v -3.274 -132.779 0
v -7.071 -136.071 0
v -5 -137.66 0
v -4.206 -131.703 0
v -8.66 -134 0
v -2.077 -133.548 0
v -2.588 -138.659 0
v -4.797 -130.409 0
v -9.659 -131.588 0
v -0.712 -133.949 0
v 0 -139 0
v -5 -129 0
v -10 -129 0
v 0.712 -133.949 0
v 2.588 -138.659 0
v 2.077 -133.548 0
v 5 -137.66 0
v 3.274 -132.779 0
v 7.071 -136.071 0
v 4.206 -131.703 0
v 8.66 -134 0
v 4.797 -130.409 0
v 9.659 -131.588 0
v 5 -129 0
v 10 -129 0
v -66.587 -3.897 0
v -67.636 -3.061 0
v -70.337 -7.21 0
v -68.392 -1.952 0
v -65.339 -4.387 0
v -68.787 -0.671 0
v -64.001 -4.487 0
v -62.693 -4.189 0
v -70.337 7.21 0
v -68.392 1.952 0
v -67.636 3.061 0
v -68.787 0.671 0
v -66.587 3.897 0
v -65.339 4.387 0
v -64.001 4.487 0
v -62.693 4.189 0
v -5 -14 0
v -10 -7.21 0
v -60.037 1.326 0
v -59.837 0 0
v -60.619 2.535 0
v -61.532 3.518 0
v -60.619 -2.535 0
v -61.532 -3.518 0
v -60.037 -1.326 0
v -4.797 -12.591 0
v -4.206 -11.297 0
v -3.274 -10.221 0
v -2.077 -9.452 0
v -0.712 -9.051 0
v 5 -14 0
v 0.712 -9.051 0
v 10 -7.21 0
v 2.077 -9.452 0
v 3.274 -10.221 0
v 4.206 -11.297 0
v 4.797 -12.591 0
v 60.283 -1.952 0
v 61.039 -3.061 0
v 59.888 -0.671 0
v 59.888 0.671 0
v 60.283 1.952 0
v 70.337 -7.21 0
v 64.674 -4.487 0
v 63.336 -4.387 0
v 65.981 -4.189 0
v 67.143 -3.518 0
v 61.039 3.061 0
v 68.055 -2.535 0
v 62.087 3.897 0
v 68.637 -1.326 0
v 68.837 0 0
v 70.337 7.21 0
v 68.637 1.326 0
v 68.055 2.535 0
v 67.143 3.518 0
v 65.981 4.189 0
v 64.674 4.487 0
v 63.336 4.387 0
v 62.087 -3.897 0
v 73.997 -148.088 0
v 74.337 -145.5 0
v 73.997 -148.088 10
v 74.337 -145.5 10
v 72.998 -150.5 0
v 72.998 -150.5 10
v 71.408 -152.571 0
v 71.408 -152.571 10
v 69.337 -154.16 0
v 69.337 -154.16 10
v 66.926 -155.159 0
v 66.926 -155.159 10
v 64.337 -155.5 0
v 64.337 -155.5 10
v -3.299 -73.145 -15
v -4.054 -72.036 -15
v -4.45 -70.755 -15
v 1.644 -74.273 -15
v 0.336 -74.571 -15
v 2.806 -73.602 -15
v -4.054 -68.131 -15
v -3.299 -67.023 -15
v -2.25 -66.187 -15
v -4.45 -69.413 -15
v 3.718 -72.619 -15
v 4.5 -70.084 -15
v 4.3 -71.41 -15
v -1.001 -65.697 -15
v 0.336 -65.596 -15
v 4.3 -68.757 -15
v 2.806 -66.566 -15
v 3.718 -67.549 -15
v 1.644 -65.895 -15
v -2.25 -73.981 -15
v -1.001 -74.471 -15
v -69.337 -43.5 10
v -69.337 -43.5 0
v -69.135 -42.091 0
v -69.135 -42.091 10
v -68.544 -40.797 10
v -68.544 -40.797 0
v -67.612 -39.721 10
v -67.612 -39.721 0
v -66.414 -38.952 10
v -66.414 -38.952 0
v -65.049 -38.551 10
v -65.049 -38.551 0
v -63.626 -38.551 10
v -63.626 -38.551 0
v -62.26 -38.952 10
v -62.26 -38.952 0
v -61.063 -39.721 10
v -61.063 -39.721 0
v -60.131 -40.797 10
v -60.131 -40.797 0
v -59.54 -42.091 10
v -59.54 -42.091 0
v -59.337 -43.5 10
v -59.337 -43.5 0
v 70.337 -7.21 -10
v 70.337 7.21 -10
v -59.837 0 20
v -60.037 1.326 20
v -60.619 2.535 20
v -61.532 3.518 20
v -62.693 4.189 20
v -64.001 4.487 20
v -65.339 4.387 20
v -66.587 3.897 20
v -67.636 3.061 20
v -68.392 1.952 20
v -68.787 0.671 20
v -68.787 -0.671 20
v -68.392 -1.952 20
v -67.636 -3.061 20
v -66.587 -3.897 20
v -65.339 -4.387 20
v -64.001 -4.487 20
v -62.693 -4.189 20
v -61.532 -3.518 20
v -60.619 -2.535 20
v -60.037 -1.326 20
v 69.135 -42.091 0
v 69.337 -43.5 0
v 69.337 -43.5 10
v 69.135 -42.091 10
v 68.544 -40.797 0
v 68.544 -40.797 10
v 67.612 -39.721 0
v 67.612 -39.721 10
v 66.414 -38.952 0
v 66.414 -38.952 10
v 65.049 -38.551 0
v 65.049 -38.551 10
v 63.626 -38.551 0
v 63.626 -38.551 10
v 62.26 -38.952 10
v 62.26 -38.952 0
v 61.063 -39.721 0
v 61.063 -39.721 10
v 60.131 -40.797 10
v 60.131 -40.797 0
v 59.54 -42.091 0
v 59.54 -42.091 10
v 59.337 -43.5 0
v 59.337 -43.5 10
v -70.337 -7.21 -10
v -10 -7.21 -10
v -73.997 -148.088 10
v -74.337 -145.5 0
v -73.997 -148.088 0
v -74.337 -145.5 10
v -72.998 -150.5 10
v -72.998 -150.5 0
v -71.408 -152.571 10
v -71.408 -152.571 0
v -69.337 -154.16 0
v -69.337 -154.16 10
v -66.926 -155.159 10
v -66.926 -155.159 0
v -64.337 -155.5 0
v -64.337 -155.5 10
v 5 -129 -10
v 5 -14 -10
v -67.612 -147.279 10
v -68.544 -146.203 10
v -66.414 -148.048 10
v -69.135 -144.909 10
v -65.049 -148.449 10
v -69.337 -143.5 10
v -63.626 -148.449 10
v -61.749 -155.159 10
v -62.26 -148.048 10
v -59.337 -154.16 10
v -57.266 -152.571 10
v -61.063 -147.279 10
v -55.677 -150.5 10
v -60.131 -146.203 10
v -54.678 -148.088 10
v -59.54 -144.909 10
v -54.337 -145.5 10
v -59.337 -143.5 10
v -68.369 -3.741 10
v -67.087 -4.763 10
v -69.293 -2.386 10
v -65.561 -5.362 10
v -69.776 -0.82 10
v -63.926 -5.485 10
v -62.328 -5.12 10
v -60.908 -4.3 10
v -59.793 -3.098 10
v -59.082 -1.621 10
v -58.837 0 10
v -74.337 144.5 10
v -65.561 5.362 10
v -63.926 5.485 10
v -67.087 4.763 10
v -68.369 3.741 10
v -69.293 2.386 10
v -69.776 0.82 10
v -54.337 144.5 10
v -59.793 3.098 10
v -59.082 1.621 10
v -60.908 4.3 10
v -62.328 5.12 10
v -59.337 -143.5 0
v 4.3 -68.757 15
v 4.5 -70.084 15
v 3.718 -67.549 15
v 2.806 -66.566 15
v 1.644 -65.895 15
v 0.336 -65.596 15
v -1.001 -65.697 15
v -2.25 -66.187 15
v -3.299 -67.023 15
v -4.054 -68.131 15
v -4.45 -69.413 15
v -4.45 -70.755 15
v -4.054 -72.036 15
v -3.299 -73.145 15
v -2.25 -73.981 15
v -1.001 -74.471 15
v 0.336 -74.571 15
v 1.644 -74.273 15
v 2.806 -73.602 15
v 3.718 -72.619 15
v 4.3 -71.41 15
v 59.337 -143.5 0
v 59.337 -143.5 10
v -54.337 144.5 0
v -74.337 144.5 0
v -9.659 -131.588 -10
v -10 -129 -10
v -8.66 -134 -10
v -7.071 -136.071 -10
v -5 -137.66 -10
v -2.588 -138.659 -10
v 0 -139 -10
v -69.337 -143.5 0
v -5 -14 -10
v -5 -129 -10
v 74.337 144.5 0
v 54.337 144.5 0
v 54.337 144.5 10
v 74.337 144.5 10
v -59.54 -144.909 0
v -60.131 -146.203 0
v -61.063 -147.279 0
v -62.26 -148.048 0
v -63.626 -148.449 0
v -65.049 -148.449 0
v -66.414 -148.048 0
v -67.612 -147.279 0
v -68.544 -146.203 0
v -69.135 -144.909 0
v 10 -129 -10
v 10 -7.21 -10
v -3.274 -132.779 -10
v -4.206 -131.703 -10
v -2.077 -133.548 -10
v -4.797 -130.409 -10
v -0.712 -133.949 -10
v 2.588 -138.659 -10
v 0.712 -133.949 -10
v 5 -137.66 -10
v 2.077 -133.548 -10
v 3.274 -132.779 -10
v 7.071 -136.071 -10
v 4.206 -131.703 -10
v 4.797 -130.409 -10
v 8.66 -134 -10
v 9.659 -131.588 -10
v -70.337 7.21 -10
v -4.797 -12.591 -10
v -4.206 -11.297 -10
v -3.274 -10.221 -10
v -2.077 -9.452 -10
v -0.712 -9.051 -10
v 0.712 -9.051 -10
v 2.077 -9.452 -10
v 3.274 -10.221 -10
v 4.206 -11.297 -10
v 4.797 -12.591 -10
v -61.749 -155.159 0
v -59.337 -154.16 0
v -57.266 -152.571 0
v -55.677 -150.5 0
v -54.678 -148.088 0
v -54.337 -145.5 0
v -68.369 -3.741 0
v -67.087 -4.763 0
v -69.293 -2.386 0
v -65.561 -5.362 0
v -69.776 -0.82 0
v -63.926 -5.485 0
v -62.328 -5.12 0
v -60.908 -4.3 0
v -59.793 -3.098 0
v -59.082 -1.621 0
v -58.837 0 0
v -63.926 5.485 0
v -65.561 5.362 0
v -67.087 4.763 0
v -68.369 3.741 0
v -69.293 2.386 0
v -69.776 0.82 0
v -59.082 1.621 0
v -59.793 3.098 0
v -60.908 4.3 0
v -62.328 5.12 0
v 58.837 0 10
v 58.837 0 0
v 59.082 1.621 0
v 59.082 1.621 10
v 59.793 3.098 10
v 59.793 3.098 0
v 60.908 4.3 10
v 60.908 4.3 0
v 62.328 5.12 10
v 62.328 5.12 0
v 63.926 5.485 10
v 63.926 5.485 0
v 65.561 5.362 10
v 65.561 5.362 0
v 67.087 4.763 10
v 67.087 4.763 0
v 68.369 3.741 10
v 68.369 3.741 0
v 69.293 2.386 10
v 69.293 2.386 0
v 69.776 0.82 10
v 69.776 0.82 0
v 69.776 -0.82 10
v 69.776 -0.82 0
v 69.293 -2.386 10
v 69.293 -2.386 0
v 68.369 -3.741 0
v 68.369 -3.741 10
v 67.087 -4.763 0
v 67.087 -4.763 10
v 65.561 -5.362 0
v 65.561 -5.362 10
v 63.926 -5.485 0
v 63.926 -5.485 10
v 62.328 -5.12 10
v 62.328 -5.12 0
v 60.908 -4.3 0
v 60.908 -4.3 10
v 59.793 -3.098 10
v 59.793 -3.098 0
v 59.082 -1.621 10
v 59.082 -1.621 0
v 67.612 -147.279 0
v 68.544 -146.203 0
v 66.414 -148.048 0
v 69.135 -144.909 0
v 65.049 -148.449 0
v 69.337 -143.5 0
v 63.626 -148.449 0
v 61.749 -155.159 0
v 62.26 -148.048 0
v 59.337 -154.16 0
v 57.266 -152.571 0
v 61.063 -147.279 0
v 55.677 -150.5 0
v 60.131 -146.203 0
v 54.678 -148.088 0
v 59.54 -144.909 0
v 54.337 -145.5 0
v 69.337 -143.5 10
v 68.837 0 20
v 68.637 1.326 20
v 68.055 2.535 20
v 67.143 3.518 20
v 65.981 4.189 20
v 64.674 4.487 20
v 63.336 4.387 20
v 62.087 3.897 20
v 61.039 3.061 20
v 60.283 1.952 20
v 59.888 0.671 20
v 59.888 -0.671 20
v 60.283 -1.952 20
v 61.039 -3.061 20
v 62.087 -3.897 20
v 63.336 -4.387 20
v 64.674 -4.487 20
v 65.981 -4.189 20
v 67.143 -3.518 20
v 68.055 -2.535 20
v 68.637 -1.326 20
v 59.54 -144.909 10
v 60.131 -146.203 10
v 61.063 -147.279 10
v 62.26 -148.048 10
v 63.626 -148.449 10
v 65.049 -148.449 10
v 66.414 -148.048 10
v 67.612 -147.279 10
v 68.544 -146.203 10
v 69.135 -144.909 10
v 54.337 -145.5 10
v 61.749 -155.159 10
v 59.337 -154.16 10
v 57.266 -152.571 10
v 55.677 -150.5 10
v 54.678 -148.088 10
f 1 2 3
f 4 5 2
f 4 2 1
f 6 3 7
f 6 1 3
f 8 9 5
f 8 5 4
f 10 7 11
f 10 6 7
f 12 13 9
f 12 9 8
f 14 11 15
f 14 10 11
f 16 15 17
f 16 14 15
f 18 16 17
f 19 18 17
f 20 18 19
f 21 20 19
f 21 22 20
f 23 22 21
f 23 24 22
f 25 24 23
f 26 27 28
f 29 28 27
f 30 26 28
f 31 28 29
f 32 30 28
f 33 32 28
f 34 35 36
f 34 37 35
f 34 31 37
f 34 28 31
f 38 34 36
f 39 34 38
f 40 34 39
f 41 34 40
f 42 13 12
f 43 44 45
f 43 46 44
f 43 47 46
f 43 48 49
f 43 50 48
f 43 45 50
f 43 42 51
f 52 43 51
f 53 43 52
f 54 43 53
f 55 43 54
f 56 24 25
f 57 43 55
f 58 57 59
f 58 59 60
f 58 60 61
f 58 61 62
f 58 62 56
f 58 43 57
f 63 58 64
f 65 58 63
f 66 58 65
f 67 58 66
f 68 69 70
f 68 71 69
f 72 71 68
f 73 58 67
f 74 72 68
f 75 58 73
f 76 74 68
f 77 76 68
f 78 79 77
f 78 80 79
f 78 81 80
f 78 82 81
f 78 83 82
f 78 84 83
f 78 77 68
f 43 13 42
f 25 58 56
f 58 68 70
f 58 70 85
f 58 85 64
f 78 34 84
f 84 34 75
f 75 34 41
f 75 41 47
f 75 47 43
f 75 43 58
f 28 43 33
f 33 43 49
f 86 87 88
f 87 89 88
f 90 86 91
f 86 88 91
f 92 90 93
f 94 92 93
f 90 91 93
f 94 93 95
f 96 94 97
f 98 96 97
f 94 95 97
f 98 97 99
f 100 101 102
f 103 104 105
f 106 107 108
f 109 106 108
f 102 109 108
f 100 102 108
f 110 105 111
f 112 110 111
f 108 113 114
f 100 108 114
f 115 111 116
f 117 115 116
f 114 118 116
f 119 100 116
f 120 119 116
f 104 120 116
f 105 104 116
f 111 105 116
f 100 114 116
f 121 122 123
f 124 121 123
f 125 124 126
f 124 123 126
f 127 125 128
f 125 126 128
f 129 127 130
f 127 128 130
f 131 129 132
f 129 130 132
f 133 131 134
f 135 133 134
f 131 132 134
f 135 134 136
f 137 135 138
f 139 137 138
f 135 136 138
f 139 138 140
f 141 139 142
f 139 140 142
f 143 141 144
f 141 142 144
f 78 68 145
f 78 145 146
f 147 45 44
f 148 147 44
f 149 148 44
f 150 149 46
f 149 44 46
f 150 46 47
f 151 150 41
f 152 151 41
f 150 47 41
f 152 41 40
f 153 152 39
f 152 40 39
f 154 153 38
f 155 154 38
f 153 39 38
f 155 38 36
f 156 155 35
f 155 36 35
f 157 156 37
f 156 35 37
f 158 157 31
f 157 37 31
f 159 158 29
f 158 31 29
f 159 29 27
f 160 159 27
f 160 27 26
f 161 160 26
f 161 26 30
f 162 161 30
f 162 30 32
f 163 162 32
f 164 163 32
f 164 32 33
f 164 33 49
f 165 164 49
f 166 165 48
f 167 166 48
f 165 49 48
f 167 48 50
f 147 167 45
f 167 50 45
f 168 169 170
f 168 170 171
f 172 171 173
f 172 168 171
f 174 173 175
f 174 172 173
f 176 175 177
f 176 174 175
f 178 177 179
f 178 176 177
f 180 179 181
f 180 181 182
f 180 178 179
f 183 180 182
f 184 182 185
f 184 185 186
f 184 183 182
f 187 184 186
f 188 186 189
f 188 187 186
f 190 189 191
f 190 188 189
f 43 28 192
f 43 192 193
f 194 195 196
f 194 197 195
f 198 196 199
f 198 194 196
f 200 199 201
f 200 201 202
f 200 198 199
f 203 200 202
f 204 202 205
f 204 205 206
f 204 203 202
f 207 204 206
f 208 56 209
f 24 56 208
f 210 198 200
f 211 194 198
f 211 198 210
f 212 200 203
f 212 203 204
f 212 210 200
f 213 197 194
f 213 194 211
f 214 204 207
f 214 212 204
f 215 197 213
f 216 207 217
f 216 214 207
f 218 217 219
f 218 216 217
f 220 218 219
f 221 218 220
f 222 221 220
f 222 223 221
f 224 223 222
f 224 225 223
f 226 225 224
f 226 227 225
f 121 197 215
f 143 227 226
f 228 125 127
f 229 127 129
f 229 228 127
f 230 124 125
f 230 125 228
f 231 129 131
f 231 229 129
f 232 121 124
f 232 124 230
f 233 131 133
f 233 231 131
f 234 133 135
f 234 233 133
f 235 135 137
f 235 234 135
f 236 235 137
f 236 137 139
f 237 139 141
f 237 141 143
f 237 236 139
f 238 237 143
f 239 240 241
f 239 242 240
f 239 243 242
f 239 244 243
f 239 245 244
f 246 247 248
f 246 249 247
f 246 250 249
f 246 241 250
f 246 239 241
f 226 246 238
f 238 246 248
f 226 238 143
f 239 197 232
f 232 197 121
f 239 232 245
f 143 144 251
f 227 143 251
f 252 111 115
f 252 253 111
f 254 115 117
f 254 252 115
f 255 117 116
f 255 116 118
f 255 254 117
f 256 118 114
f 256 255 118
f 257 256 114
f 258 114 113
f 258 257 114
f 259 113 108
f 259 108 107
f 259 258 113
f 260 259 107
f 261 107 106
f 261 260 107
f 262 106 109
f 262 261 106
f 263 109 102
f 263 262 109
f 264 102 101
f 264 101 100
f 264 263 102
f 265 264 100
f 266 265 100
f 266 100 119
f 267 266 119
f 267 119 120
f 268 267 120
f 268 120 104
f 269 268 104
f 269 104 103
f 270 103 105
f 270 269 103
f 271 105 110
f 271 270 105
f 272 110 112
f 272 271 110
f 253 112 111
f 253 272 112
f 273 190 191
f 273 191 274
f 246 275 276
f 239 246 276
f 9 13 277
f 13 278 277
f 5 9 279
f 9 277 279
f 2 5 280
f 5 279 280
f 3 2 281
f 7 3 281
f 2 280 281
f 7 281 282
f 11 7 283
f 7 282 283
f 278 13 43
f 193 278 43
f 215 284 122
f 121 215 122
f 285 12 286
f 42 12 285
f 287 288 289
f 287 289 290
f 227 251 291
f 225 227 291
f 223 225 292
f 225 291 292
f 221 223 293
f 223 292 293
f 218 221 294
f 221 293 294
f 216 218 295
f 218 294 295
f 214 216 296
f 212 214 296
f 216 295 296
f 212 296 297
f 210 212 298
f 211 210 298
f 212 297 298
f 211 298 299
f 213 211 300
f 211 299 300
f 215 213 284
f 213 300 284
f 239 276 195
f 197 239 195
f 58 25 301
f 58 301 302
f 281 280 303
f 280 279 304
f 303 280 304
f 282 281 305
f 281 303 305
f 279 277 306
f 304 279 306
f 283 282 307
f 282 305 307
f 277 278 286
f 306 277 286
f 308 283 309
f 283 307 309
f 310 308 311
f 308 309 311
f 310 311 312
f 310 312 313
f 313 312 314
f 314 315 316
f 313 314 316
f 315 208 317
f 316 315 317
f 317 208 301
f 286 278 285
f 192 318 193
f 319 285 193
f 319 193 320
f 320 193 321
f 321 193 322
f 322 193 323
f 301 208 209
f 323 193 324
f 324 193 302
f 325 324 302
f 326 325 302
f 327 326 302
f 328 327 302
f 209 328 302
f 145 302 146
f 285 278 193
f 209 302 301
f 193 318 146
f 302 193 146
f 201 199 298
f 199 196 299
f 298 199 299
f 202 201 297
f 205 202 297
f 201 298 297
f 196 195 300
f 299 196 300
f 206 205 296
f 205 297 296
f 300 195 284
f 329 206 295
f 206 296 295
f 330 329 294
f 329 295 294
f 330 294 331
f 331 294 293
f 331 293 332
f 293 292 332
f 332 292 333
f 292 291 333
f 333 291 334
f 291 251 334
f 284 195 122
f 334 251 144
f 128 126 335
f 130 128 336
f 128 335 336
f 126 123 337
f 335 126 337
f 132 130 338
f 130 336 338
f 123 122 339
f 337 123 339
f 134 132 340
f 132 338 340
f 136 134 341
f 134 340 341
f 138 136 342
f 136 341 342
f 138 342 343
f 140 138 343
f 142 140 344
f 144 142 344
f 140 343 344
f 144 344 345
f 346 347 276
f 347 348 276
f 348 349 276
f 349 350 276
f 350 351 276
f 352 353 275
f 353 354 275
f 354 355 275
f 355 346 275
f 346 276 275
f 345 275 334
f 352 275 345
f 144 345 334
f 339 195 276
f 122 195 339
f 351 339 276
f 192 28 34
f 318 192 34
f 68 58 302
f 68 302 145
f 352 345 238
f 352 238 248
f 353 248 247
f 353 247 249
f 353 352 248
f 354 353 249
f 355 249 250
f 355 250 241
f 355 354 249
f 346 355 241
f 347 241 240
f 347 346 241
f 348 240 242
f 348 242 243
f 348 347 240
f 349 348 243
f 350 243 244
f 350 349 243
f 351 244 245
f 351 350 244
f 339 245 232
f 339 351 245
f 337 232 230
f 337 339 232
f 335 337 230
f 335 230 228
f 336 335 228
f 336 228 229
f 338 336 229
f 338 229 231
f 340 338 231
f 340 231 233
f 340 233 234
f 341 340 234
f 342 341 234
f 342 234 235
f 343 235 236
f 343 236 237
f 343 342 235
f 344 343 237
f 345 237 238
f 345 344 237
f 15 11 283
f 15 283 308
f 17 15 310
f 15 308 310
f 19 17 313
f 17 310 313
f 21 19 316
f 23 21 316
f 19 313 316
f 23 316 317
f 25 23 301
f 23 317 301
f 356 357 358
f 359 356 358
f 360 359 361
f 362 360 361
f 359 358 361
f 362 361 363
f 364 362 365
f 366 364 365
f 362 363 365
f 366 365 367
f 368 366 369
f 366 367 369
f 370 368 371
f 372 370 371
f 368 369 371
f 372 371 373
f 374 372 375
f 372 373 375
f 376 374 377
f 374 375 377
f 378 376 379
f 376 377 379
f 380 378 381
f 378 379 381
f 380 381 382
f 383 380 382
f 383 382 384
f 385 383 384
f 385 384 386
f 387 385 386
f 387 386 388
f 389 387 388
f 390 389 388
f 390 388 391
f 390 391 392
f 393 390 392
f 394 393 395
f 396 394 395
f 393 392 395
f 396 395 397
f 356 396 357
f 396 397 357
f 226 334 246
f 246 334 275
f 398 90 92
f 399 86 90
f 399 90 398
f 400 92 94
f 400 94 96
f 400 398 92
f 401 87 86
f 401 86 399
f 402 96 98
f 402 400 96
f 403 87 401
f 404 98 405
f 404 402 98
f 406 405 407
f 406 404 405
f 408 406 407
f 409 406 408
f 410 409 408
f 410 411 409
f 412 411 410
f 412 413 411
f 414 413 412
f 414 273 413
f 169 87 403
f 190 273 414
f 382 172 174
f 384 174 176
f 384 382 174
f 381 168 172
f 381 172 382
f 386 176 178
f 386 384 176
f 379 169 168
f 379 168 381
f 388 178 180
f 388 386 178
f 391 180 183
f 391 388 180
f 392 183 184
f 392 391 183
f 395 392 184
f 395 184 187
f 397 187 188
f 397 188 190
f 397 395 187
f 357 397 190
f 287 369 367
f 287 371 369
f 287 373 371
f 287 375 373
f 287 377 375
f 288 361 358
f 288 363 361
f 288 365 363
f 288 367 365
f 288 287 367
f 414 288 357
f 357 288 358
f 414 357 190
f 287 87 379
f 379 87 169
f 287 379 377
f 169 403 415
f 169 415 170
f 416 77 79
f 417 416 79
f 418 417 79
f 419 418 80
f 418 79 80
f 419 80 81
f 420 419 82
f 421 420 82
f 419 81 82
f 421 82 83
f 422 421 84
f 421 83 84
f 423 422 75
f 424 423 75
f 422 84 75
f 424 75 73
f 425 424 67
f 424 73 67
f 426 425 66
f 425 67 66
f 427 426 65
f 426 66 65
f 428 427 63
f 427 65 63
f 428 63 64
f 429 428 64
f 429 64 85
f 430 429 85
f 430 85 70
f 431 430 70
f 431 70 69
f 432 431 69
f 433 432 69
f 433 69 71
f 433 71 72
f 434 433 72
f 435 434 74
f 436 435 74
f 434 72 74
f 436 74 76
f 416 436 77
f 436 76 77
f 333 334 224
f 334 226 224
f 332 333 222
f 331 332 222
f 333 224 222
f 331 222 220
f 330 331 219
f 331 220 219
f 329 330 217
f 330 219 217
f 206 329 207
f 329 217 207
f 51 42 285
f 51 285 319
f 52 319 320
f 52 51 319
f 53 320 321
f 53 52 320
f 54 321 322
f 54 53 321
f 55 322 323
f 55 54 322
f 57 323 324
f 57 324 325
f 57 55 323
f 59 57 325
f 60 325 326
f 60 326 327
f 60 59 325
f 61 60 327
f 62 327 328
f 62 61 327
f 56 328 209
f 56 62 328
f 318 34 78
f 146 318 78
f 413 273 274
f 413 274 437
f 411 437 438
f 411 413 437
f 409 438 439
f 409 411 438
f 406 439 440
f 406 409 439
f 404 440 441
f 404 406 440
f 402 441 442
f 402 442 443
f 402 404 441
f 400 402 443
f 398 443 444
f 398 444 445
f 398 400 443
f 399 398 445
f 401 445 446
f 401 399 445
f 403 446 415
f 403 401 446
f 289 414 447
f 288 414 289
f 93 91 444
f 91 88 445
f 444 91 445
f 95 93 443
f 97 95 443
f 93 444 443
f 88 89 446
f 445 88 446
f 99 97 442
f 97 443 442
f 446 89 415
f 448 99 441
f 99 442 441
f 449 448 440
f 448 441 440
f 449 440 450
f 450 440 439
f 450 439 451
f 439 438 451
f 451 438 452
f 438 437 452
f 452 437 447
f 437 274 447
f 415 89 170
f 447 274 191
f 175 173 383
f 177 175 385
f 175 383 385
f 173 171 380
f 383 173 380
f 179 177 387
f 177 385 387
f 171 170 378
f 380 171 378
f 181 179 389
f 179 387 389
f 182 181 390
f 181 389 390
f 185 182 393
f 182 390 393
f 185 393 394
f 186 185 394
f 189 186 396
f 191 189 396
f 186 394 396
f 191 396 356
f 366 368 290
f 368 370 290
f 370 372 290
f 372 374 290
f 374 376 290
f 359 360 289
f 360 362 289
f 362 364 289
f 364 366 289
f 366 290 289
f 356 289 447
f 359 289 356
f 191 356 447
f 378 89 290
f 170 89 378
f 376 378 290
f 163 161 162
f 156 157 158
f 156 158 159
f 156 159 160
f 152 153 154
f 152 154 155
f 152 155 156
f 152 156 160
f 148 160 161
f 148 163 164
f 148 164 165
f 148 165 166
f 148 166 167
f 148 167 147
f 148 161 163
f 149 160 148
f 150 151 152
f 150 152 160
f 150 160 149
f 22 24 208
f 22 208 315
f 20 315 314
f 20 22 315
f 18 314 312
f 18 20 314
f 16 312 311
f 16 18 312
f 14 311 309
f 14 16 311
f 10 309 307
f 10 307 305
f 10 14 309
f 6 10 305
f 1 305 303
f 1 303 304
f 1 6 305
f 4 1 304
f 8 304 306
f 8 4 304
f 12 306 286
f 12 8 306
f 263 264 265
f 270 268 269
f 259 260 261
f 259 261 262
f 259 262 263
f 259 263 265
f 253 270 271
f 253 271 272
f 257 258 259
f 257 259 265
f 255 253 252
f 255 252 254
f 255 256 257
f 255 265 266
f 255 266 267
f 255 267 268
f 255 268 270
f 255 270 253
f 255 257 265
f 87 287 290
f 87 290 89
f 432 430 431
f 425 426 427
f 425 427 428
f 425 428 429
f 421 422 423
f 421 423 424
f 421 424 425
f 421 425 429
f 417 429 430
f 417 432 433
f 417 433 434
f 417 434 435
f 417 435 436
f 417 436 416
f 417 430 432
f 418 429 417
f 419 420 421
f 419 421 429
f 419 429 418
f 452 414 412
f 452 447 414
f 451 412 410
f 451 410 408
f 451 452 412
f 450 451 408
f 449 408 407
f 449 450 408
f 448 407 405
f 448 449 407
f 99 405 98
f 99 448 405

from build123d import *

# Parameters (mm, degrees)
F0_W      = 140.6747102737
F0_H      = 14.4206369296
F1_DEPTH  = 10
F2_R      = 4.5
F3_DEPTH  = 20
F4_W      = 16
F4_H      = 14.4206369296
F4_R      = 5.5
F5_DEPTH  = 10
F7_R      = 4.5
F8_DEPTH  = 15
F9_W      = 20
F9_H      = 131.7896815352
F10_DEPTH = 10
F11_R     = 9.99999
F12_R     = 9.99999
F13_R     = 9.99999


# Not quite as in the source:
# - a fillet or chamfer is up to 0.001 mm smaller than in the source, because OpenCascade refuses the exact size


with BuildPart() as f1:
    # F0 (on Top) → F1 (new body)
    with BuildSketch(Plane.XY):
        Rectangle(F0_W, F0_H)
    extrude(amount=-F1_DEPTH)

    # F2 (on face) → F3 (join)
    with BuildSketch(Plane.XY):
        with Locations((-64.3373551369, 0)):
            Circle(F2_R)
        with Locations((64.3373551369, 0)):
            Circle(F2_R)
    extrude(amount=F3_DEPTH)

    # F9 (on face) → F10 (join, through all)
    with BuildSketch(Plane.XY):
        with Locations((0, -73.1051592324)):
            Rectangle(F9_W, F9_H)
        with BuildLine():
            ThreePointArc((-5, -14), (0, -9), (5, -14))
            Line((5, -14), (5, -129))
            ThreePointArc((5, -129), (0, -134), (-5, -129))
            Line((-5, -129), (-5, -14))
        make_face(mode=Mode.SUBTRACT)
    extrude(amount=-F10_DEPTH)

    # F13 (radius 10 in the source; OpenCascade refuses exactly that, so slightly less here)
    f13_edges = [f1.edges().sort_by_distance(p)[0] for p in [
        (-10, -139, -5),
        (10, -139, -5),
    ]]
    fillet(f13_edges, radius=F13_R)


with BuildPart() as f5:
    # F4 (on face) → F5 (new body)
    with BuildSketch(Plane.XY):
        Polygon((-54.3373551369, 144.5), (-74.3373551369, 144.5), (-74.3373551369, -155.5), (-54.3373551369, -155.5), (-54.3373551369, -7.2103184648), (-70.3373551369, -7.2103184648), (-70.3373551369, 7.2103184648), (-54.3373551369, 7.2103184648), align=None)
        with BuildLine():
            ThreePointArc((-69.3373551369, -43.5), (-64.3373551369, -38.5), (-59.3373551369, -43.5))
            Line((-59.3373551369, -43.5), (-59.3373551369, -143.5))
            ThreePointArc((-59.3373551369, -143.5), (-64.3373551369, -148.5), (-69.3373551369, -143.5))
            Line((-69.3373551369, -143.5), (-69.3373551369, -43.5))
        make_face(mode=Mode.SUBTRACT)
        with Locations((-62.3373551369, 0)):
            Rectangle(F4_W, F4_H)
        with Locations((-64.3373551369, 0)):
            Circle(F4_R, mode=Mode.SUBTRACT)
    extrude(amount=F5_DEPTH)


with BuildPart() as f6_1:
    # F6: instance of F5
    add(f5.part.mirror(Plane.YZ))

    # F12 (radius 10 in the source; OpenCascade refuses exactly that, so slightly less here)
    f12_edges = [f6_1.edges().sort_by_distance(p)[0] for p in [
        (54.337355, -155.5, 5),
        (74.337355, -155.5, 5),
    ]]
    fillet(f12_edges, radius=F12_R)


with BuildPart() as f8:
    # F7 (on Top) → F8 (new body, symmetric)
    with BuildSketch(Plane.XY):
        with Locations((0, -70.0838316902)):
            Circle(F7_R)
    extrude(amount=F8_DEPTH, both=True)


with BuildPart() as f5_1:
    add(f5.part)

    # F11 (radius 10 in the source; OpenCascade refuses exactly that, so slightly less here)
    f11_edges = [f5_1.edges().sort_by_distance(p)[0] for p in [
        (-74.337355, -155.5, 5),
        (-54.337355, -155.5, 5),
    ]]
    fillet(f11_edges, radius=F11_R)


solid = Compound([f1.part, f6_1.part, f8.part, f5_1.part])
